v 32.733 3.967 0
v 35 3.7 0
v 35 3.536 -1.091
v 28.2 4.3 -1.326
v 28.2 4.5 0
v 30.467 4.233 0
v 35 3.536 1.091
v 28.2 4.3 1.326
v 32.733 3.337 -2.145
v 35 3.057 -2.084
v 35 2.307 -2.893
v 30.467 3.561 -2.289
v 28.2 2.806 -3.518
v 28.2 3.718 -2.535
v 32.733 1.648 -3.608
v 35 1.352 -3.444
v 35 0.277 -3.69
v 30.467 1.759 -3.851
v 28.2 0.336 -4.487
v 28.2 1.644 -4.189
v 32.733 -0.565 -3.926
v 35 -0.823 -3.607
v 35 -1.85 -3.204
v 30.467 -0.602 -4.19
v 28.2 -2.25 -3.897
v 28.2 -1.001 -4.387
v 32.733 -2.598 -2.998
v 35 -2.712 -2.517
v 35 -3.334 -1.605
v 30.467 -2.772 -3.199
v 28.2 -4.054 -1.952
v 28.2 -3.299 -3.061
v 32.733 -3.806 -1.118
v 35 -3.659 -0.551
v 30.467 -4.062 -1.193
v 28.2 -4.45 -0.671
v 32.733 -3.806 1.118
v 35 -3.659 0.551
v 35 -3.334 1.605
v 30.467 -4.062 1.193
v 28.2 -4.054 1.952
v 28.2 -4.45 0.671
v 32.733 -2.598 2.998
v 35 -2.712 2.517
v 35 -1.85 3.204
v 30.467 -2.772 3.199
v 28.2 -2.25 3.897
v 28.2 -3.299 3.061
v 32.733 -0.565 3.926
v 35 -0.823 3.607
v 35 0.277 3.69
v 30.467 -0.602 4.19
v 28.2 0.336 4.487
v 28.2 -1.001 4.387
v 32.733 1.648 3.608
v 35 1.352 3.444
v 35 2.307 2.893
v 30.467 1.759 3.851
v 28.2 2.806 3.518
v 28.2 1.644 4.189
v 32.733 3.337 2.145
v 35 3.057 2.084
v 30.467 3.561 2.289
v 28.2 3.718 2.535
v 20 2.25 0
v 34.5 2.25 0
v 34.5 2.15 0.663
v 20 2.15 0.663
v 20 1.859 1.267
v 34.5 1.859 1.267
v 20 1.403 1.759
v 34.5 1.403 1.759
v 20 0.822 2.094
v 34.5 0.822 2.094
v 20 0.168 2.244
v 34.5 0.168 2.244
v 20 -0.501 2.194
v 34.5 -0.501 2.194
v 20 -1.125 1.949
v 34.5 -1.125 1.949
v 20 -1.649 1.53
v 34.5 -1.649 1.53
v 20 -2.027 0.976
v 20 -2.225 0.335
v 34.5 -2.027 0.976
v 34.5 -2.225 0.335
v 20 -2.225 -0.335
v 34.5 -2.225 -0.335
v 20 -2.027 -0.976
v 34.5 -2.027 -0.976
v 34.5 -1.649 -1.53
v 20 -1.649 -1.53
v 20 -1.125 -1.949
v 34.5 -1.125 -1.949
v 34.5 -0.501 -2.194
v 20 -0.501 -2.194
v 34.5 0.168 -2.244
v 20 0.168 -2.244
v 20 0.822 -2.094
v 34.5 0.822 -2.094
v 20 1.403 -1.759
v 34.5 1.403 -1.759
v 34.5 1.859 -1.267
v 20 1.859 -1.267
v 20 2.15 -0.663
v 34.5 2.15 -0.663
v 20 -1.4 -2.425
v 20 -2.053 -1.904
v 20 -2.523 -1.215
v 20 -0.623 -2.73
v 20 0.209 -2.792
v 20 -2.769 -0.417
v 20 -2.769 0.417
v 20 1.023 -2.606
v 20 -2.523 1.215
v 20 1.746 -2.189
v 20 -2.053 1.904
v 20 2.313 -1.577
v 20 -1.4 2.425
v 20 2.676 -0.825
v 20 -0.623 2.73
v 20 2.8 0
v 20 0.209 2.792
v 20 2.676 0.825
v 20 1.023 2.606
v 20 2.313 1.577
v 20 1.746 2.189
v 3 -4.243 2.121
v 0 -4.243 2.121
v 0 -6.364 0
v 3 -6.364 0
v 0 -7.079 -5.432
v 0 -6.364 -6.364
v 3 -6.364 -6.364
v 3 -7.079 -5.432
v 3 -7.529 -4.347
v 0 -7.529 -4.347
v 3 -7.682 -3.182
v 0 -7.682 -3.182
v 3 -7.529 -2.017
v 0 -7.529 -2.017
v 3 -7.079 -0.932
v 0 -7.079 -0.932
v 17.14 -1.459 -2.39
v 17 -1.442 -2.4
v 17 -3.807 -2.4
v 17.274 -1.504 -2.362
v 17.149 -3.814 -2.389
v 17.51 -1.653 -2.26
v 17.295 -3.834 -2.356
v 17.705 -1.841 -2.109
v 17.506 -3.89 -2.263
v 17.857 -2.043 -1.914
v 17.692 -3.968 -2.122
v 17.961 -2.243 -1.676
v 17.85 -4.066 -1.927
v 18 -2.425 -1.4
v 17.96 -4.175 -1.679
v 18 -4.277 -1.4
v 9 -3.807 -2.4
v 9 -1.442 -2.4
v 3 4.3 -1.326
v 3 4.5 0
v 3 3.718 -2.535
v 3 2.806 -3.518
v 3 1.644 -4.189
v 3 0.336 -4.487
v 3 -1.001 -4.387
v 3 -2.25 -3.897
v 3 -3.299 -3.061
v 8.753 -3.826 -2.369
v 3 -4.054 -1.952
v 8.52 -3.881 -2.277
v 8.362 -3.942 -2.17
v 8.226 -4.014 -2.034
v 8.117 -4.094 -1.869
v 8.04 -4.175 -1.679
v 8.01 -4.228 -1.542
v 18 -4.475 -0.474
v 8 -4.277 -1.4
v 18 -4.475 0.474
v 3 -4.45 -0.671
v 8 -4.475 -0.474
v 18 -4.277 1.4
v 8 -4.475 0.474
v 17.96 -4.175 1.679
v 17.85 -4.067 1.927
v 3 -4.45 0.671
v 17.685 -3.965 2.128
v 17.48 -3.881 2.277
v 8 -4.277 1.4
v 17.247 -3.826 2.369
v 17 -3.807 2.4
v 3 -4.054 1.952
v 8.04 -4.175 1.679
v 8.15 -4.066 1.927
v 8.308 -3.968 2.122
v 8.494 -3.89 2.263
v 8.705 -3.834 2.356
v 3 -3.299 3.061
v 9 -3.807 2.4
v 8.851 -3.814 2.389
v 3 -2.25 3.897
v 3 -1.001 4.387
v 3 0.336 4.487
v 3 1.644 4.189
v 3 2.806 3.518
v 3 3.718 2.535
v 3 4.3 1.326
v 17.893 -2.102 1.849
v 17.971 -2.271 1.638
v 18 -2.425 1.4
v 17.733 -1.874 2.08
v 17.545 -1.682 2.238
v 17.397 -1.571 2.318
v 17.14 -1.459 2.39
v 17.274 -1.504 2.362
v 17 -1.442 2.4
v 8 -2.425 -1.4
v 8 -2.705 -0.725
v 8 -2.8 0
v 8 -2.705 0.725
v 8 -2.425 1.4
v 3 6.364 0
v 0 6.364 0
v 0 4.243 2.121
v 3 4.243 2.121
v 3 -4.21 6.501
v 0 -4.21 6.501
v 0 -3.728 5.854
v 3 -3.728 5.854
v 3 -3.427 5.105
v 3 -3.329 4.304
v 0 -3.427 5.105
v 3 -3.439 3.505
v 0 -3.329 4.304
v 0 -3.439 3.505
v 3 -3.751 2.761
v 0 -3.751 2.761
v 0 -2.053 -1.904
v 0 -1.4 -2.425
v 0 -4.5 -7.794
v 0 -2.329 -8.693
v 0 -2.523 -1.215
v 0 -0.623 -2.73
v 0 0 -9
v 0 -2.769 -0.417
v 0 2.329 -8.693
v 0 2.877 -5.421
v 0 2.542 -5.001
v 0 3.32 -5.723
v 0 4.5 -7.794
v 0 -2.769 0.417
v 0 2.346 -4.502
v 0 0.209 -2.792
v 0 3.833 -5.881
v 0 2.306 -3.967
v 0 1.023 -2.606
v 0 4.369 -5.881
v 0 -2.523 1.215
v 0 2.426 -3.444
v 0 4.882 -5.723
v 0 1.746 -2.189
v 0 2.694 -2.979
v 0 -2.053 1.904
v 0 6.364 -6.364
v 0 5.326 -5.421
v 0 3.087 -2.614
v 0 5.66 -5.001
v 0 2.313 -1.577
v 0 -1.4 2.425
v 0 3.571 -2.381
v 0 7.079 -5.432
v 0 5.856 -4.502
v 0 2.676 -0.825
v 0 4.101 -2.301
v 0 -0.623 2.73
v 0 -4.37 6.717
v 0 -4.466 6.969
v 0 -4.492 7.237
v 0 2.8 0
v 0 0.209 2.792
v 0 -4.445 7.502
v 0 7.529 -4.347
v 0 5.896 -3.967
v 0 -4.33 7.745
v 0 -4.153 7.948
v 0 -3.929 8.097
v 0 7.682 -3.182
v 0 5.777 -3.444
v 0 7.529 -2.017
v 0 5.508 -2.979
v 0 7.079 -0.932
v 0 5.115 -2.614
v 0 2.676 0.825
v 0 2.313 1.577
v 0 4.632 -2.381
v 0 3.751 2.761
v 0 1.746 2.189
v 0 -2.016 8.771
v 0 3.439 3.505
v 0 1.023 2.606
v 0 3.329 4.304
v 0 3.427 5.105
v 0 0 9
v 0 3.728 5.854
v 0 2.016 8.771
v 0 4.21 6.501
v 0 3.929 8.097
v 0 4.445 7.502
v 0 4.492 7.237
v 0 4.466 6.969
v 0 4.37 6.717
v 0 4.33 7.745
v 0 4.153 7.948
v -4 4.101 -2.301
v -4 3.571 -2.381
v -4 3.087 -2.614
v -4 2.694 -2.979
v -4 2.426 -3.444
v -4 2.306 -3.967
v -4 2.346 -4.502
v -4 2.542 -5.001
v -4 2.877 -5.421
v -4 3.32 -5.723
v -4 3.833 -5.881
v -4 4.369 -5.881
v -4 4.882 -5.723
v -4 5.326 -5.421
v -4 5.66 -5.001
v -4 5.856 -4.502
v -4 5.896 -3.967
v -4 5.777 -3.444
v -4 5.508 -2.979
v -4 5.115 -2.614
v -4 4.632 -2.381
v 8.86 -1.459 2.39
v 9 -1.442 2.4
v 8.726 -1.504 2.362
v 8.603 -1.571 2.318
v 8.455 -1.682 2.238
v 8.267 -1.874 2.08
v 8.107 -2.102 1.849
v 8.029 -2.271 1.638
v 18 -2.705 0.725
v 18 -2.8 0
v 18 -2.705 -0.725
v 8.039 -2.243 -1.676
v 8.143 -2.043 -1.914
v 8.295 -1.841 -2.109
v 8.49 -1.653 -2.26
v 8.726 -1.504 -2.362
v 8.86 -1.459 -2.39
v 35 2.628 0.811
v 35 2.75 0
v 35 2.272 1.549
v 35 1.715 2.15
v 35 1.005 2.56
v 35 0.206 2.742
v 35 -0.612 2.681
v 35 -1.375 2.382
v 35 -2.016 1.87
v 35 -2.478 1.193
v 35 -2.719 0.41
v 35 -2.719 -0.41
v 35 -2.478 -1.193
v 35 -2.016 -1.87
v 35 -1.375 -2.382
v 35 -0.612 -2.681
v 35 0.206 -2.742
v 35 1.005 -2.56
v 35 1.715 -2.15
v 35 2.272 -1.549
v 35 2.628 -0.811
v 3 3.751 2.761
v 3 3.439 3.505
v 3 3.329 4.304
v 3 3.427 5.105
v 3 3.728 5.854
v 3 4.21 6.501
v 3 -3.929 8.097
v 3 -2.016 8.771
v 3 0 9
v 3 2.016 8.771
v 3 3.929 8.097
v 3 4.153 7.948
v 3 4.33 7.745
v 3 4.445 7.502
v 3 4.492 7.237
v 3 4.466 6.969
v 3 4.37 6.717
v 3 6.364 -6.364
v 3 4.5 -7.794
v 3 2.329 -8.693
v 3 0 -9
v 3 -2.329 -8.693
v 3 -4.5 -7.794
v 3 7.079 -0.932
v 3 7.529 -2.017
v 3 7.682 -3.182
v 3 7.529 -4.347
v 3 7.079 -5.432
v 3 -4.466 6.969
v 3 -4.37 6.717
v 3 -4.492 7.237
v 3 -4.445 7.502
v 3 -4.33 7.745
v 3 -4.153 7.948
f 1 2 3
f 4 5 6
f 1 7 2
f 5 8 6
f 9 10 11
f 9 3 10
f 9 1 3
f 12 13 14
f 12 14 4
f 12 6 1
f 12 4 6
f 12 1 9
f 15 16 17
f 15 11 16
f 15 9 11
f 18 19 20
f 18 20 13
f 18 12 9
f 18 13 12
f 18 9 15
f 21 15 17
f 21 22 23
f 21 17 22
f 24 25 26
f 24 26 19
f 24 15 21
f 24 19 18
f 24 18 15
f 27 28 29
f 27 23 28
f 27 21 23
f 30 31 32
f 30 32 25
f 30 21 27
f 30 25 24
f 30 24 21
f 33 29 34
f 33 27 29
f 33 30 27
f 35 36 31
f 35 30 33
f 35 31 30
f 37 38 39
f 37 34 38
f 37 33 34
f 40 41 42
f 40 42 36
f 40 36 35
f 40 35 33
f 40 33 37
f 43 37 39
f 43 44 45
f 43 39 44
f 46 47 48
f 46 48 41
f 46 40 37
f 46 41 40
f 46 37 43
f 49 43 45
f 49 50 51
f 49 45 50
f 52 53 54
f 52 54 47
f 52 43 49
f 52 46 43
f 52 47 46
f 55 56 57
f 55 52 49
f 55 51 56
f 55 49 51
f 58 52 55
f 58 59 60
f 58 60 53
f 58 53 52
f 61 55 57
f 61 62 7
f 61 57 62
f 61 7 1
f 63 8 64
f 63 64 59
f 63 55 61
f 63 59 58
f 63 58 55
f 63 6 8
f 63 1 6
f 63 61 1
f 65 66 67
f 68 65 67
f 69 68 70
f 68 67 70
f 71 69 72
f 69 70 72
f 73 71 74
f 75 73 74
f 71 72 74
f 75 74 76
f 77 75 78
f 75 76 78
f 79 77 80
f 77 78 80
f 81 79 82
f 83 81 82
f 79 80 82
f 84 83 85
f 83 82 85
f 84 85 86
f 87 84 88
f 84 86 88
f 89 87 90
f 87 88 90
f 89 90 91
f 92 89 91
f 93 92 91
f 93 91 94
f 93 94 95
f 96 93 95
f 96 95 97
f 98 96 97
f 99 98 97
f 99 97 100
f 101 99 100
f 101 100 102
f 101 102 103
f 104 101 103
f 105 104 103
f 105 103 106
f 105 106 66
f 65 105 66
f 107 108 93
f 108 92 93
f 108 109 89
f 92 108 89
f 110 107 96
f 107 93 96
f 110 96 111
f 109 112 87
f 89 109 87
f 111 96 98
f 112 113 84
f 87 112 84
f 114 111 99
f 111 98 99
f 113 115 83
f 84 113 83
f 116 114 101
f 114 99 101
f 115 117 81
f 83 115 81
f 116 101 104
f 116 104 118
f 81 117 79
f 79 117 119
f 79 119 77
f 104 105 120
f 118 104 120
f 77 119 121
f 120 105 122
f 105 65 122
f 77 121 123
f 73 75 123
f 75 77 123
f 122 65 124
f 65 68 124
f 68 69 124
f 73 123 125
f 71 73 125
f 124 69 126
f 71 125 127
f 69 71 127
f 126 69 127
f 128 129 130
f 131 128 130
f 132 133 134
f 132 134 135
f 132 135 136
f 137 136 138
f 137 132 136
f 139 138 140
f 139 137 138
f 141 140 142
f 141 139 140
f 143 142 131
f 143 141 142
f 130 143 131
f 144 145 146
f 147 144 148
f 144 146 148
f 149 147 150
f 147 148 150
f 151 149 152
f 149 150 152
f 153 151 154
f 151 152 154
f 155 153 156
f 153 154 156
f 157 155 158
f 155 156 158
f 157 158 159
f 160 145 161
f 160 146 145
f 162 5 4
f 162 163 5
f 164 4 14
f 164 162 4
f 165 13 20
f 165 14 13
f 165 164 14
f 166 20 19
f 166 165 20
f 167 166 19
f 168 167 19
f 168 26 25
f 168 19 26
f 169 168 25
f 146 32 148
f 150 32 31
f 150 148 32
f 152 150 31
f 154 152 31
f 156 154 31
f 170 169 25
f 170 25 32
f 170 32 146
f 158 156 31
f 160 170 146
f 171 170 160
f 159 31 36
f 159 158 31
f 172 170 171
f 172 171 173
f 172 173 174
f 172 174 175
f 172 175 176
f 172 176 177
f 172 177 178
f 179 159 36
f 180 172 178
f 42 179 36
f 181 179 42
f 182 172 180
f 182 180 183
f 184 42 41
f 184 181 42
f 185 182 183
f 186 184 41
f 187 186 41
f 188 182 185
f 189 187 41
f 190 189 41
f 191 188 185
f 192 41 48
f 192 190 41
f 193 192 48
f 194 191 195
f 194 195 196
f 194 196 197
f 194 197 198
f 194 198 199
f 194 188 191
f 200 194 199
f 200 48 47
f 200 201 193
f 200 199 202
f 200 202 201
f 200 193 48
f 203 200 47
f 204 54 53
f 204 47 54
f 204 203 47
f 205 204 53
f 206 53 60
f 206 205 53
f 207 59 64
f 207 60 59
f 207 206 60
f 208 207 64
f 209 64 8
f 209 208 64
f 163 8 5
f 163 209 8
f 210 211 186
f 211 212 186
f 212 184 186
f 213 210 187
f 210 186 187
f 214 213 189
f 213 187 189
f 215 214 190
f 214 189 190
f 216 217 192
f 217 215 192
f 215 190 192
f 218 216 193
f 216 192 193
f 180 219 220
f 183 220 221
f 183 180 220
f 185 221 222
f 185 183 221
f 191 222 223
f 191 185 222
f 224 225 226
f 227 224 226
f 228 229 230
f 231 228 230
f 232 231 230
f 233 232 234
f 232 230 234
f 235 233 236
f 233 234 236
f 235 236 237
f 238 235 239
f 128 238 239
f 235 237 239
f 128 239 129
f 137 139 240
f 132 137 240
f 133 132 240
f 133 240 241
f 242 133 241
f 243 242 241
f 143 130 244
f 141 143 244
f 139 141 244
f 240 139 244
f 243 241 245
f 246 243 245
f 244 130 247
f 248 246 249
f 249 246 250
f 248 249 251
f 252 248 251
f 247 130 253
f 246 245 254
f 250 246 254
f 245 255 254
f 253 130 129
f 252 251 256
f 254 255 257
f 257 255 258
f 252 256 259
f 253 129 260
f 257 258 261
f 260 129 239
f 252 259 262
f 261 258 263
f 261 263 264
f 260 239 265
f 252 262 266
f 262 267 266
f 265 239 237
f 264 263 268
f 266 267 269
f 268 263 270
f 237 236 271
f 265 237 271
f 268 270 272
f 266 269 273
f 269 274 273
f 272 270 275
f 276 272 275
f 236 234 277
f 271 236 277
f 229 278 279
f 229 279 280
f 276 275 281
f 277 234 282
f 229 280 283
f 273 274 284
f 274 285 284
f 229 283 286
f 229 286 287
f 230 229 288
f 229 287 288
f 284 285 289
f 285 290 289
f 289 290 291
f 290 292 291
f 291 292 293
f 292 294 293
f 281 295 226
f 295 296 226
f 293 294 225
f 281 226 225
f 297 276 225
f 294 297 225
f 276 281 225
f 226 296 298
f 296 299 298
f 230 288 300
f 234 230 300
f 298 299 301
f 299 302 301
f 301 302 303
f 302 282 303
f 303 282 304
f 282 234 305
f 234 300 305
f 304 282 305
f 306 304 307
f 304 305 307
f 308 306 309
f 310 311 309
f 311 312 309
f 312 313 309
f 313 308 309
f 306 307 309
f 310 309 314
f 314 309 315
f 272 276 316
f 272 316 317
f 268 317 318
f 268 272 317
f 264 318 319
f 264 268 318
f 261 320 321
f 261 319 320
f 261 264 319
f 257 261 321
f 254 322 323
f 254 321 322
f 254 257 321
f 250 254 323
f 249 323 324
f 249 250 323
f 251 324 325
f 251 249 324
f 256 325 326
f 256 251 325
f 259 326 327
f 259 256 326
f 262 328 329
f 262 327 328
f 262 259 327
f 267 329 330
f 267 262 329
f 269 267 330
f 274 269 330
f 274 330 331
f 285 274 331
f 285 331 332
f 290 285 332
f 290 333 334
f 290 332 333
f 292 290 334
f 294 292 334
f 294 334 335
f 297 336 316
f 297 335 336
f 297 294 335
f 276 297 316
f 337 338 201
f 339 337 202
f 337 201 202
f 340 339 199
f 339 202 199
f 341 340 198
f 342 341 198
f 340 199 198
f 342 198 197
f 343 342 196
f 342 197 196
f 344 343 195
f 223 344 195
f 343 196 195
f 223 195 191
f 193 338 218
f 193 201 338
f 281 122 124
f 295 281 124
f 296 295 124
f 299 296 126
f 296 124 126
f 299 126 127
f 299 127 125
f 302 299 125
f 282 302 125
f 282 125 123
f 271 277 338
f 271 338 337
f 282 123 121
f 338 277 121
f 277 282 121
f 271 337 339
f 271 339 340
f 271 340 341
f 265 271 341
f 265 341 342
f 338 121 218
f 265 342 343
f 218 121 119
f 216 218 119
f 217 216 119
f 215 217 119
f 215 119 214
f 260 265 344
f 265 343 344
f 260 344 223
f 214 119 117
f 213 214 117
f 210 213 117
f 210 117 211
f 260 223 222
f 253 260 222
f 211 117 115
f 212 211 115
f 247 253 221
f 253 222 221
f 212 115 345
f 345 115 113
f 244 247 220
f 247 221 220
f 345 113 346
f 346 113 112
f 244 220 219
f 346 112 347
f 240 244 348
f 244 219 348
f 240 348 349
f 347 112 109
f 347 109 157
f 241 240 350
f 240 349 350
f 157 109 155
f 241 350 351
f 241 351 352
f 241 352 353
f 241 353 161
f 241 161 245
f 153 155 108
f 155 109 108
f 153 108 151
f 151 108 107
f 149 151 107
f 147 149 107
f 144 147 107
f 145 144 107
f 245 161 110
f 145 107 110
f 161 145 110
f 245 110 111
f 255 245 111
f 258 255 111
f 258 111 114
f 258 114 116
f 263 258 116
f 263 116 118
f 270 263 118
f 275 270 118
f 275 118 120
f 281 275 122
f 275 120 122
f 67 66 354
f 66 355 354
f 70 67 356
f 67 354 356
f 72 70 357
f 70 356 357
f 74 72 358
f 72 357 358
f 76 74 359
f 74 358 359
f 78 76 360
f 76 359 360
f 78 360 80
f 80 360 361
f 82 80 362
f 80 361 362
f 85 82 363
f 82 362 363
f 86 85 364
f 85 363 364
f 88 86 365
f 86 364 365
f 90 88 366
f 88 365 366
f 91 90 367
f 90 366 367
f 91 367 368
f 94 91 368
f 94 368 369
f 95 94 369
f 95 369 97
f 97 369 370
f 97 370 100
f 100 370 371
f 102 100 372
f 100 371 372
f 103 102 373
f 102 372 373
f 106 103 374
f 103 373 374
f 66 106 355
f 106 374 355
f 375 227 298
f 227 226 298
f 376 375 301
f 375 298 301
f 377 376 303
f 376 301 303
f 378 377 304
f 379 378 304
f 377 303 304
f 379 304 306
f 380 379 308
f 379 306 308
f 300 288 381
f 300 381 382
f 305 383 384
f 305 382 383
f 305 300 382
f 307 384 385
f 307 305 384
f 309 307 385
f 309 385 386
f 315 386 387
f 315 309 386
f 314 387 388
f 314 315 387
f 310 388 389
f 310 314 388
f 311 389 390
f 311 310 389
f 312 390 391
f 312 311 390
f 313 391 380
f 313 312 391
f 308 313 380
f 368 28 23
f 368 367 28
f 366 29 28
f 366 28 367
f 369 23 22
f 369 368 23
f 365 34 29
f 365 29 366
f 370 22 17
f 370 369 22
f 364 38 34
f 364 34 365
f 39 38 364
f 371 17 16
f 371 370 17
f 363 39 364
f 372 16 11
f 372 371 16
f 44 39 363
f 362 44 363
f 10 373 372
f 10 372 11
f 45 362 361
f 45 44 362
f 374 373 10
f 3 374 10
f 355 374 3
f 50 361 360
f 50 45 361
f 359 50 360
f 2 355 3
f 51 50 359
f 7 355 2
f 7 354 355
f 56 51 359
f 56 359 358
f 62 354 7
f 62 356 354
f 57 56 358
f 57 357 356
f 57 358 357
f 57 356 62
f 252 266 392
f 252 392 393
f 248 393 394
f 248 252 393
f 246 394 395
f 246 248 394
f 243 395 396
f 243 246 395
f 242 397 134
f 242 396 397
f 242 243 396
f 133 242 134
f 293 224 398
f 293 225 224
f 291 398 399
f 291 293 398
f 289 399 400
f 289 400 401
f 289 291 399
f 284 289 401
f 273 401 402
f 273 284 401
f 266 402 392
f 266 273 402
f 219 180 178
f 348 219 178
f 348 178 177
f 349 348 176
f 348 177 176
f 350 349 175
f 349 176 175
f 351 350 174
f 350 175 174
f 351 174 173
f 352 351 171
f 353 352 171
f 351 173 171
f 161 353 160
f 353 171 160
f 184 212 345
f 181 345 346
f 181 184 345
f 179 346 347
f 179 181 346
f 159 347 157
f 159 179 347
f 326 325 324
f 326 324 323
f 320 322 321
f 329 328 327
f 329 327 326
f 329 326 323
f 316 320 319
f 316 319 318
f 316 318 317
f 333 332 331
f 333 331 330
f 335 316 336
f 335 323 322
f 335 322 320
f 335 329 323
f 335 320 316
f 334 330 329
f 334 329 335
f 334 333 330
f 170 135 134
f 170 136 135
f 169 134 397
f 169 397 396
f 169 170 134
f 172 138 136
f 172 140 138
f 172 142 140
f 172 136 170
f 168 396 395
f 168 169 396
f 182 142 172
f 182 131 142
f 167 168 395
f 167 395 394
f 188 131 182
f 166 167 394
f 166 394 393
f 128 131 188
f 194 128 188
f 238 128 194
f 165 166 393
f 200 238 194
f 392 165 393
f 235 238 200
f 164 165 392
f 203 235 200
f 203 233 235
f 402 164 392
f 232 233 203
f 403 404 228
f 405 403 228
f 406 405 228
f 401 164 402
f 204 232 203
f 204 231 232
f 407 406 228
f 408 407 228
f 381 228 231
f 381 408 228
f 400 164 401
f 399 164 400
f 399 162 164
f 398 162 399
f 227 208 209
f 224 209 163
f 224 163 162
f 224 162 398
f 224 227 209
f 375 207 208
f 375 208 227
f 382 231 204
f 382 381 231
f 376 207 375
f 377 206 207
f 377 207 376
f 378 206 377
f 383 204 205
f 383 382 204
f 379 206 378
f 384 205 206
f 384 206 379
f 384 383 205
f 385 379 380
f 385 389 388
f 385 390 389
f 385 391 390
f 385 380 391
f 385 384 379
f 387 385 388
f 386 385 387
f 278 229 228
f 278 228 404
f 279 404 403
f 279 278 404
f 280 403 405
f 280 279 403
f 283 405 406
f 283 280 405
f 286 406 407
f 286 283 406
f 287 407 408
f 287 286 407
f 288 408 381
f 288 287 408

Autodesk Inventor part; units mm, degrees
ref_plane "YZ-Ebene" through (0, 0, 0) normal (1, 0, 0) x (0, 1, 0)
ref_plane "XY-Ebene" through (0, 0, 0) normal (0, 0, 1) x (1, 0, 0)
sketch "Skizze1" plane through (0, 0, 0) normal (0, 0, 1) x (1, 0, 0)
  line L0 (-7, 0) -> (42, 0) projected
  line L1 (0, -1.8) -> (0, 10.8) projected
  line L2 (0, 2.8) -> (20, 2.8)
  line L3 (20, 2.8) -> (20, 2.25)
  line L4 (20, 2.25) -> (35, 2.25)
  line L5 (35, 2.25) -> (35, 3.7)
  line L6 (35, 3.7) -> (28.2, 4.5)
  line L7 (28.2, 4.5) -> (3, 4.5)
  line L8 (3, 4.5) -> (3, 9)
  line L9 (3, 9) -> (0, 9)
  line L10 (0, 9) -> (0, 2.8)
  point P0 (0, 0)
  dimension "d0" = 35
  dimension "d1" = 9
  dimension "d2" = 4.5
  dimension "d3" = 2.8
  dimension "d4" = 2.25
  dimension "d5" = 3.7
  dimension "d6" = 3
  dimension "d7" = 6.8
  dimension "d8" = 20
revolve "Umdrehung1" add sketch "Skizze1" angle 360 about axis through (-10, 0, 0) along (1, 0, 0)
chamfer "Fase1" distance 0.5 distance2 0.5 1 edges at (35, -2.25, 0) measured on face at (30, 2.2209, -0.3609)
ref_plane "Arbeitsebene1" through (15.6, -4.5, 0) normal (0, 1, 0) x (-1, 0, 0)
sketch "Skizze2" plane through (15.6, -4.5, 0) normal (0, 1, 0) x (-1, 0, 0)
  line L0 (15.6, 9) -> (15.6, -9) projected
  line L1 (6.6, 2.4) -> (-1.4, 2.4)
  line L2 (-2.4, 1.4) -> (-2.4, -1.4)
  line L3 (-1.4, -2.4) -> (6.6, -2.4)
  line L4 (7.6, -1.4) -> (7.6, 1.4)
  arc A0 (7.6, 1.4) -> (6.6, 2.4) centre (6.6, 1.4) ccw
  arc A1 (-1.4, 2.4) -> (-2.4, 1.4) centre (-1.4, 1.4) ccw
  arc A2 (-2.4, -1.4) -> (-1.4, -2.4) centre (-1.4, -1.4) ccw
  arc A3 (6.6, -2.4) -> (7.6, -1.4) centre (6.6, -1.4) ccw
  line L5 (12.6, 4.5) -> (12.6, -4.5) projected
  line L6 (-12.6, 4.5) -> (-12.6, -4.5) projected
  line L7 (12.6, 4.5) -> (12.6, -4.5) projected
  line L8 (-4.4, -2.8) -> (15.6, -2.8) projected
  point P0 (15.6, 0)
  point P1 (-2.4, -2.4)
  point P2 (-2.4, 2.4)
  point P3 (7.6, -2.4)
  dimension "d13" = 10
  dimension "d14" = 8
  dimension "d15" = 4.8
  dimension "d16" = 1
extrude "Extrusion1" cut sketch "Skizze2" along normal up to next
sketch "Skizze3" plane through (0, 0, 0) normal (-1, 0, 0) x (0, 0, 1)
  circle A0 centre (0, 0) radius 2.8 projected
  circle A1 centre (0, 0) radius 9 projected
  circle A2 centre (-4.1012, 4.1012) radius 1.8
  line L0 (0, -12.6) -> (0, 12.6) projected
  line L1 (0, 0) -> (-4.1012, 4.1012) construction
  dimension "d19" = 3.6
  dimension "d23" = 5.8
  dimension "d24" = 45
extrude "Extrusion2" add sketch "Skizze3" along normal blind 4 contours A2
sketch "Skizze4" plane through (0, 0, 0) normal (-1, 0, 0) x (0, 0, 1)
  circle A0 centre (-4.1012, 4.1012) radius 1.8 projected
  circle A1 centre (0, 0) radius 9 projected
  line L0 (0, 0) -> (-4.1012, 4.1012) construction
  arc A2 (0, 6.364) -> (-6.364, 6.364) centre (-3.182, 3.182) ccw
  line L1 (0, 6.364) -> (2.1213, 4.2426)
  arc A3 (2.1213, 4.2426) -> (6.5007, 4.2102) centre (4.3275, 6.4488) ccw
  arc A4 (8.097, 3.9293) -> (6.5007, 4.2102) centre (7.1973, 3.4927) ccw
  dimension "d28" = 9
  dimension "d32" = 4.5
  dimension "d33" = 3.12
  dimension "d34" = 1
  dimension "d36" = 3
extrude "Extrusion3" cut sketch "Skizze4" against normal through all contours A4 A3 L1 A2 A1 picked at (1.838, 6.3142)
ref_plane "Arbeitsebene2" through (0, 0, 0) normal (0, 0.7071, 0.7071) x (1, 0, 0)
mirror "Spiegeln1" about plane through (0, 0, 0) normal (0, 1, 0) of "Extrusion3"
thread "Gewinde1" size "M5x0.5" class "6H" standard "ANSI Metric M Profile" length 15.103
ref_plane "Arbeitsebene3" through (0, 0, 0) normal (0, 0.7071, -0.7071) x (1, 0, 0)
properties part number "Kurbelwelle_ra8846s" material "Stahl"
